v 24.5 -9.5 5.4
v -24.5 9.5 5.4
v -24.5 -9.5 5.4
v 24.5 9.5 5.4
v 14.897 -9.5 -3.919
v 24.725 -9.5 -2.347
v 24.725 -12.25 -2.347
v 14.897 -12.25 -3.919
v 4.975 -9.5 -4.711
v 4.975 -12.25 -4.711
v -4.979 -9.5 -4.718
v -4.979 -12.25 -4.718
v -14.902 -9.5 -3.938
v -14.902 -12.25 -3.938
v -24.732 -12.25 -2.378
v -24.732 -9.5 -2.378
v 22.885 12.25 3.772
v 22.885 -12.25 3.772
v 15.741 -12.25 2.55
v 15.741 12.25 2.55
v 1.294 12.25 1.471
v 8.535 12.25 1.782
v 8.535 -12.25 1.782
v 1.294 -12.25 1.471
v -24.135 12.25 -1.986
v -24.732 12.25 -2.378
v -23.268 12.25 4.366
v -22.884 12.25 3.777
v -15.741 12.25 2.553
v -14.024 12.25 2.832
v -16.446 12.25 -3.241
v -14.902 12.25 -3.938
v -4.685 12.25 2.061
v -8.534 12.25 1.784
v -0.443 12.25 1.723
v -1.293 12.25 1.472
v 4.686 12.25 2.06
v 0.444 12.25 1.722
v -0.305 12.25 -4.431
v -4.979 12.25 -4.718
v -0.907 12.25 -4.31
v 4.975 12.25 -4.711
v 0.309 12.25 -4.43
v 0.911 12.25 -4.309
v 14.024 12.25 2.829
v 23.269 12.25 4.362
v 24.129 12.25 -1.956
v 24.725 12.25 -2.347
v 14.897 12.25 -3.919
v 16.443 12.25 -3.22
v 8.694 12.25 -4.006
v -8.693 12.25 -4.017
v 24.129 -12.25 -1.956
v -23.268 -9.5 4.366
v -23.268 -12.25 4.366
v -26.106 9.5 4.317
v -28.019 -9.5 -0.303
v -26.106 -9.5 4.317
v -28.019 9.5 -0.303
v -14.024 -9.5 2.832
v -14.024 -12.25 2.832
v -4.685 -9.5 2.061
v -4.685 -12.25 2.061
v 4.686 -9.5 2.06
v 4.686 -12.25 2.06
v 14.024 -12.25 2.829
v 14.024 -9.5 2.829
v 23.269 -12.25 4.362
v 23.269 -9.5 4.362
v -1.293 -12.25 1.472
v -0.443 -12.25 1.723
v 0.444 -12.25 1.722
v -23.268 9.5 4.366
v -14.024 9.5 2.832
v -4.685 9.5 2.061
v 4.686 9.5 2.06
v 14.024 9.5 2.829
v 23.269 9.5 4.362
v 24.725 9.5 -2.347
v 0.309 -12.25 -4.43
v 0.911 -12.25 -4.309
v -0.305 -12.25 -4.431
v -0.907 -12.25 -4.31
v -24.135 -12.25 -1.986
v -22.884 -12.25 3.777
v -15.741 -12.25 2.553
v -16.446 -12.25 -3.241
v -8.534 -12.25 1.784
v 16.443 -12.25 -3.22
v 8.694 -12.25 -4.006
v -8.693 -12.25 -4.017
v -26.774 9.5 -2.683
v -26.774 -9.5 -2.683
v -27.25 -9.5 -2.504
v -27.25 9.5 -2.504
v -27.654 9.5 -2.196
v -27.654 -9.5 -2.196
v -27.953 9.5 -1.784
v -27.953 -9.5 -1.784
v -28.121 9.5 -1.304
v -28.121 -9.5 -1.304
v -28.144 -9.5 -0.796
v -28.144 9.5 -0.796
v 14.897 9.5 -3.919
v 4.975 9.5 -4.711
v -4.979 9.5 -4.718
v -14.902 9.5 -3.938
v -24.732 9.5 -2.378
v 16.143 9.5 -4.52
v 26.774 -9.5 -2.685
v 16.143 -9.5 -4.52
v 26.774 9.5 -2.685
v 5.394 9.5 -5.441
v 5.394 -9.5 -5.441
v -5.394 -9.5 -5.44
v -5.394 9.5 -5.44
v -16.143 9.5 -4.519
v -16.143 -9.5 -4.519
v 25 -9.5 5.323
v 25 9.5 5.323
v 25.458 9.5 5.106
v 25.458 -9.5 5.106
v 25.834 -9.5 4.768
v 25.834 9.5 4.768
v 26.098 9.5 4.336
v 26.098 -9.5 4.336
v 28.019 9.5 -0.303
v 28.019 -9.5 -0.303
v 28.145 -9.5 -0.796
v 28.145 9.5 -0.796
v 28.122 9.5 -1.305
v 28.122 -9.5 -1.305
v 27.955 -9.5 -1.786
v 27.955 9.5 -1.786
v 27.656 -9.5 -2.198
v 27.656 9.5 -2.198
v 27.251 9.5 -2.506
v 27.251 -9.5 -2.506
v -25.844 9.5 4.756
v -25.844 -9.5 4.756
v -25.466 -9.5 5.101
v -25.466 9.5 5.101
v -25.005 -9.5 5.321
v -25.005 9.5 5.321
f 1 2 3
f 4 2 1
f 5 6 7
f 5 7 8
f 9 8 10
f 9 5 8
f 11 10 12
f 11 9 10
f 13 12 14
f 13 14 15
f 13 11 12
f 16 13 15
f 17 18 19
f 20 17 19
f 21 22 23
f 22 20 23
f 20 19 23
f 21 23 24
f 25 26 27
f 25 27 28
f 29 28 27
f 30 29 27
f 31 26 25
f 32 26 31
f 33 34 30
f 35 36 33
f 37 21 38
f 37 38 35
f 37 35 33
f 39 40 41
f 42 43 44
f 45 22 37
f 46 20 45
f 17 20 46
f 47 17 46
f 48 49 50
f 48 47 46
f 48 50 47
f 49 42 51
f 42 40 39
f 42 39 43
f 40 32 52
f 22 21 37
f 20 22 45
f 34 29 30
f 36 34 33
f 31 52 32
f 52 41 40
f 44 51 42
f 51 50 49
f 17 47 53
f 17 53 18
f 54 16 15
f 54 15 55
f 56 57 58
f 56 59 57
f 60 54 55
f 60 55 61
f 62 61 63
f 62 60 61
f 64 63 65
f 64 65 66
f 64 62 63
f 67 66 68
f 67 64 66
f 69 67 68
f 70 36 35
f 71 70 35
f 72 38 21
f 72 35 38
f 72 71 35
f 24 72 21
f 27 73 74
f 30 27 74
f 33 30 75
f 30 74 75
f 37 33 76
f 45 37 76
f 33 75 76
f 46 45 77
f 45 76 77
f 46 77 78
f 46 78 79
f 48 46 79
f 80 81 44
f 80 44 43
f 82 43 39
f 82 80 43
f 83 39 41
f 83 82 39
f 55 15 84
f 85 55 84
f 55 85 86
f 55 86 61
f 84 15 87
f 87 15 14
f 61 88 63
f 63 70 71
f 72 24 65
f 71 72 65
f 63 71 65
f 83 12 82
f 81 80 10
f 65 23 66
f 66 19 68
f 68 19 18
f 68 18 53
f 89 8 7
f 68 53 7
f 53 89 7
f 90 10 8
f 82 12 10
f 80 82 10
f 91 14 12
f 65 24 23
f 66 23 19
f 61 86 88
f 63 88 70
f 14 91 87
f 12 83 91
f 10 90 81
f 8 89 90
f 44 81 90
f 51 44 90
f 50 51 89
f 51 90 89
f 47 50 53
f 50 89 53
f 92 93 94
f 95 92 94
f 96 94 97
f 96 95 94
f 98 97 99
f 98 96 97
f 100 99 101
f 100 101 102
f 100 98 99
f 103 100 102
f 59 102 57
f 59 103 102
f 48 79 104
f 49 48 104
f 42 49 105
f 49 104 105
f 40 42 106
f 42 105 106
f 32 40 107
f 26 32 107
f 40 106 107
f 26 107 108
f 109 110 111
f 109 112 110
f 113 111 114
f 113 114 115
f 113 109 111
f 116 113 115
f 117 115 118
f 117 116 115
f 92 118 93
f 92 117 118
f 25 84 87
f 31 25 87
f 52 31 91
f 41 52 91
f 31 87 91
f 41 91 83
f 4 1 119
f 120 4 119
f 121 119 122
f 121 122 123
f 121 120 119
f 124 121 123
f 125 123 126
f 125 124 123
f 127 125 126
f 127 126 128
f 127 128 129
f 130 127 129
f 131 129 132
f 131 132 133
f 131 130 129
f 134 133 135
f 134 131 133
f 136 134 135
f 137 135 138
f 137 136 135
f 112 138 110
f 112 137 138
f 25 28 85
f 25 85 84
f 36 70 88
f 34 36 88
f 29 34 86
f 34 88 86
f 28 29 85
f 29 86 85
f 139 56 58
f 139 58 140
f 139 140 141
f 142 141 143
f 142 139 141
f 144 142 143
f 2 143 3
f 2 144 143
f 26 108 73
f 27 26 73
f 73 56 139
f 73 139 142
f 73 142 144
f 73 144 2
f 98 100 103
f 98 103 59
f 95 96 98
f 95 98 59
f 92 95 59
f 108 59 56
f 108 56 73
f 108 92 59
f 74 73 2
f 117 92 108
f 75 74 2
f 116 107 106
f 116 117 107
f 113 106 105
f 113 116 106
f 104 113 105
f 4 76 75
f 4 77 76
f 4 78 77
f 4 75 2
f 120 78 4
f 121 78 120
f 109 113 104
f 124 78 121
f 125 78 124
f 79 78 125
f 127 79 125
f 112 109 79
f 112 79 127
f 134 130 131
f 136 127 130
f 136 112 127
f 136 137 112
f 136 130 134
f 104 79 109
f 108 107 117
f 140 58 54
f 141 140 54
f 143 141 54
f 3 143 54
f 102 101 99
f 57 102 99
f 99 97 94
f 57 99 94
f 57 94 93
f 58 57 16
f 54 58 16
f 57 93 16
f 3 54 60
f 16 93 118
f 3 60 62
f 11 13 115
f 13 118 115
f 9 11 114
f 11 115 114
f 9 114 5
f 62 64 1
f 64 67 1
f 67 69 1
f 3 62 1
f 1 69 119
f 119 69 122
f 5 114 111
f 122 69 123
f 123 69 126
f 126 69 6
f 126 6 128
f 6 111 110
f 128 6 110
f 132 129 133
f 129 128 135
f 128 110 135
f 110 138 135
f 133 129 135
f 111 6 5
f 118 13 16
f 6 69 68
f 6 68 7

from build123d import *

# Parameters (mm, degrees)
BOSS_EXTRUDE1_DEPTH     = 9.5
BOSS_EXTRUDE4_DEPTH     = 19
BOSS_EXTRUDE5_DEPTH     = 2.75
CUT_EXTRUDE1_DEPTH      = 37.007750295
CUT_EXTRUDE1_DEPTH_BACK = 37.007750295
CUT_EXTRUDE2_DEPTH      = 38.700107179
CUT_EXTRUDE2_DEPTH_BACK = 38.700107179
SKETCH8_R               = 3.1


with BuildPart() as part:
    # Sketch1 → Boss-Extrude1 (new, symmetric)
    with BuildSketch(Plane(origin=(0, 0, 0), x_dir=(1, 0, 0), z_dir=(0, 1, 0))):
        with BuildLine():
            Line((-28.019427969, 0.30265419), (-26.106010807, -4.316743473))
            ThreePointArc((-26.106010807, -4.316743473), (-25.466467114, -5.100606473), (-24.5, -5.399602554))
            Line((-24.5, -5.399602554), (24.5, -5.399578272))
            ThreePointArc((24.5, -5.399578272), (25.457917057, -5.106354456), (26.098112281, -4.3358122))
            Line((26.098112281, -4.3358122), (28.019427969, 0.30265419))
            ThreePointArc((28.019427969, 0.30265419), (27.954595682, 1.785598461), (26.77403281, 2.685375236))
            ThreePointArc((26.77403281, 2.685375236), (0, 5.555679504), (-26.77374766, 2.682716614))
            ThreePointArc((-26.77374766, 2.682716614), (-27.953111468, 1.783959509), (-28.019427969, 0.30265419))
        make_face()
        with BuildLine():
            Line((-26.90965458, 0.889831635), (-24.967422855, -3.799130535))
            ThreePointArc((-24.967422855, -3.799130535), (-24.732603169, -4.057099402), (-24.386863498, -4.103492305))
            ThreePointArc((-24.386863498, -4.103492305), (0, -1.488014765), (24.386863498, -4.103492305))
            ThreePointArc((24.386863498, -4.103492305), (24.690465194, -4.081962763), (24.928721144, -3.892564732))
            Line((24.928721144, -3.892564732), (26.842138305, 0.72683293))
            ThreePointArc((26.842138305, 0.72683293), (26.889731767, 1.205196592), (26.51532004, 1.506714071))
            ThreePointArc((26.51532004, 1.506714071), (0, 4.351330223), (-26.51532004, 1.506714071))
            ThreePointArc((-26.51532004, 1.506714071), (-26.843311912, 1.281900877), (-26.90965458, 0.889831635))
        make_face(mode=Mode.SUBTRACT)
    extrude(amount=BOSS_EXTRUDE1_DEPTH, both=True)

    # Sketch5 → Boss-Extrude4 (add)
    with BuildSketch(Plane(origin=(0, 9.5, 0), x_dir=(1, 0, 0), z_dir=(0, 1, 0))):
        with BuildLine():
            Line((-28.019427969, 0.30265419), (-26.106010807, -4.316743473))
            ThreePointArc((-26.106010807, -4.316743473), (-25.466467114, -5.100606473), (-24.5, -5.399602554))
            Line((-24.5, -5.399602554), (24.5, -5.399578272))
            ThreePointArc((24.5, -5.399578272), (25.457917057, -5.106354456), (26.098112281, -4.3358122))
            Line((26.098112281, -4.3358122), (28.019427969, 0.30265419))
            ThreePointArc((28.019427969, 0.30265419), (27.954595682, 1.785598461), (26.77403281, 2.685375236))
            ThreePointArc((26.77403281, 2.685375236), (0, 5.555679504), (-26.77374766, 2.682716614))
            ThreePointArc((-26.77374766, 2.682716614), (-27.953111468, 1.783959509), (-28.019427969, 0.30265419))
        make_face()
        with BuildLine():
            Line((24.128669413, 1.955613279), (22.885024946, -3.772265844))
            ThreePointArc((22.885024946, -3.772265844), (0.000255966, -1.464252732), (-22.884068151, -3.776672574))
            Line((-22.884068151, -3.776672574), (-24.135292964, 1.986119507))
            ThreePointArc((-24.135292964, 1.986119507), (-0.001831478, 4.312848519), (24.128669413, 1.955613279))
        make_face(mode=Mode.SUBTRACT)
    extrude(amount=-BOSS_EXTRUDE4_DEPTH)

    # Sketch6 → Boss-Extrude5 (add)
    with BuildSketch(Plane(origin=(0, 9.5, 0), x_dir=(1, 0, 0), z_dir=(0, 1, 0))):
        with BuildLine():
            Line((-24.732023245, 2.377976913), (-23.267684412, -4.366358828))
            ThreePointArc((-23.267684412, -4.366358828), (0.000256463, -1.964252734), (23.268661469, -4.361858777))
            Line((23.268661469, -4.361858777), (24.725263361, 2.346842775))
            ThreePointArc((24.725263361, 2.346842775), (-0.001837352, 4.812848622), (-24.732023245, 2.377976913))
        make_face()
        with BuildLine():
            Line((-23.538121832, 1.592231661), (-22.5, -3.189067597))
            ThreePointArc((-22.5, -3.189067597), (0.000255268, -0.964252729), (22.500936706, -3.184753392))
            Line((22.500936706, -3.184753392), (23.531635738, 1.562358523))
            ThreePointArc((23.531635738, 1.562358523), (-0.001824238, 3.812848414), (-23.538121832, 1.592231661))
        make_face(mode=Mode.SUBTRACT)
    boss_extrude5 = extrude(amount=BOSS_EXTRUDE5_DEPTH)

    # Mirror1: Boss-Extrude5 across plane
    add(boss_extrude5.mirror(Plane.ZX))

    # Sketch5<2> → Cut-Extrude1 (cut, two sides: drawn at the far end of the back side and taken through both)
    with BuildSketch(Plane(origin=(0, 9.5, 0), x_dir=(1, 0, 0), z_dir=(0, 1, 0)).offset(-CUT_EXTRUDE1_DEPTH_BACK)):
        with BuildLine():
            Line((24.128669413, 1.955613279), (22.885024946, -3.772265844))
            ThreePointArc((22.885024946, -3.772265844), (0.000255966, -1.464252732), (-22.884068151, -3.776672574))
            Line((-22.884068151, -3.776672574), (-24.135292964, 1.986119507))
            ThreePointArc((-24.135292964, 1.986119507), (-0.001831478, 4.312848519), (24.128669413, 1.955613279))
        make_face()
    extrude(amount=CUT_EXTRUDE1_DEPTH + CUT_EXTRUDE1_DEPTH_BACK, mode=Mode.SUBTRACT)

    # Sketch8 → Cut-Extrude2 (cut, two sides: drawn at the far end of the back side and taken through both)
    with BuildSketch(Plane(origin=(0, 12.2, 0), x_dir=(1, 0, 0), z_dir=(0, 1, 0)).offset(-CUT_EXTRUDE2_DEPTH_BACK)):
        with Locations((0, 1.34568742)):
            Circle(SKETCH8_R)
    extrude(amount=CUT_EXTRUDE2_DEPTH + CUT_EXTRUDE2_DEPTH_BACK, mode=Mode.SUBTRACT)


solid = part.part
